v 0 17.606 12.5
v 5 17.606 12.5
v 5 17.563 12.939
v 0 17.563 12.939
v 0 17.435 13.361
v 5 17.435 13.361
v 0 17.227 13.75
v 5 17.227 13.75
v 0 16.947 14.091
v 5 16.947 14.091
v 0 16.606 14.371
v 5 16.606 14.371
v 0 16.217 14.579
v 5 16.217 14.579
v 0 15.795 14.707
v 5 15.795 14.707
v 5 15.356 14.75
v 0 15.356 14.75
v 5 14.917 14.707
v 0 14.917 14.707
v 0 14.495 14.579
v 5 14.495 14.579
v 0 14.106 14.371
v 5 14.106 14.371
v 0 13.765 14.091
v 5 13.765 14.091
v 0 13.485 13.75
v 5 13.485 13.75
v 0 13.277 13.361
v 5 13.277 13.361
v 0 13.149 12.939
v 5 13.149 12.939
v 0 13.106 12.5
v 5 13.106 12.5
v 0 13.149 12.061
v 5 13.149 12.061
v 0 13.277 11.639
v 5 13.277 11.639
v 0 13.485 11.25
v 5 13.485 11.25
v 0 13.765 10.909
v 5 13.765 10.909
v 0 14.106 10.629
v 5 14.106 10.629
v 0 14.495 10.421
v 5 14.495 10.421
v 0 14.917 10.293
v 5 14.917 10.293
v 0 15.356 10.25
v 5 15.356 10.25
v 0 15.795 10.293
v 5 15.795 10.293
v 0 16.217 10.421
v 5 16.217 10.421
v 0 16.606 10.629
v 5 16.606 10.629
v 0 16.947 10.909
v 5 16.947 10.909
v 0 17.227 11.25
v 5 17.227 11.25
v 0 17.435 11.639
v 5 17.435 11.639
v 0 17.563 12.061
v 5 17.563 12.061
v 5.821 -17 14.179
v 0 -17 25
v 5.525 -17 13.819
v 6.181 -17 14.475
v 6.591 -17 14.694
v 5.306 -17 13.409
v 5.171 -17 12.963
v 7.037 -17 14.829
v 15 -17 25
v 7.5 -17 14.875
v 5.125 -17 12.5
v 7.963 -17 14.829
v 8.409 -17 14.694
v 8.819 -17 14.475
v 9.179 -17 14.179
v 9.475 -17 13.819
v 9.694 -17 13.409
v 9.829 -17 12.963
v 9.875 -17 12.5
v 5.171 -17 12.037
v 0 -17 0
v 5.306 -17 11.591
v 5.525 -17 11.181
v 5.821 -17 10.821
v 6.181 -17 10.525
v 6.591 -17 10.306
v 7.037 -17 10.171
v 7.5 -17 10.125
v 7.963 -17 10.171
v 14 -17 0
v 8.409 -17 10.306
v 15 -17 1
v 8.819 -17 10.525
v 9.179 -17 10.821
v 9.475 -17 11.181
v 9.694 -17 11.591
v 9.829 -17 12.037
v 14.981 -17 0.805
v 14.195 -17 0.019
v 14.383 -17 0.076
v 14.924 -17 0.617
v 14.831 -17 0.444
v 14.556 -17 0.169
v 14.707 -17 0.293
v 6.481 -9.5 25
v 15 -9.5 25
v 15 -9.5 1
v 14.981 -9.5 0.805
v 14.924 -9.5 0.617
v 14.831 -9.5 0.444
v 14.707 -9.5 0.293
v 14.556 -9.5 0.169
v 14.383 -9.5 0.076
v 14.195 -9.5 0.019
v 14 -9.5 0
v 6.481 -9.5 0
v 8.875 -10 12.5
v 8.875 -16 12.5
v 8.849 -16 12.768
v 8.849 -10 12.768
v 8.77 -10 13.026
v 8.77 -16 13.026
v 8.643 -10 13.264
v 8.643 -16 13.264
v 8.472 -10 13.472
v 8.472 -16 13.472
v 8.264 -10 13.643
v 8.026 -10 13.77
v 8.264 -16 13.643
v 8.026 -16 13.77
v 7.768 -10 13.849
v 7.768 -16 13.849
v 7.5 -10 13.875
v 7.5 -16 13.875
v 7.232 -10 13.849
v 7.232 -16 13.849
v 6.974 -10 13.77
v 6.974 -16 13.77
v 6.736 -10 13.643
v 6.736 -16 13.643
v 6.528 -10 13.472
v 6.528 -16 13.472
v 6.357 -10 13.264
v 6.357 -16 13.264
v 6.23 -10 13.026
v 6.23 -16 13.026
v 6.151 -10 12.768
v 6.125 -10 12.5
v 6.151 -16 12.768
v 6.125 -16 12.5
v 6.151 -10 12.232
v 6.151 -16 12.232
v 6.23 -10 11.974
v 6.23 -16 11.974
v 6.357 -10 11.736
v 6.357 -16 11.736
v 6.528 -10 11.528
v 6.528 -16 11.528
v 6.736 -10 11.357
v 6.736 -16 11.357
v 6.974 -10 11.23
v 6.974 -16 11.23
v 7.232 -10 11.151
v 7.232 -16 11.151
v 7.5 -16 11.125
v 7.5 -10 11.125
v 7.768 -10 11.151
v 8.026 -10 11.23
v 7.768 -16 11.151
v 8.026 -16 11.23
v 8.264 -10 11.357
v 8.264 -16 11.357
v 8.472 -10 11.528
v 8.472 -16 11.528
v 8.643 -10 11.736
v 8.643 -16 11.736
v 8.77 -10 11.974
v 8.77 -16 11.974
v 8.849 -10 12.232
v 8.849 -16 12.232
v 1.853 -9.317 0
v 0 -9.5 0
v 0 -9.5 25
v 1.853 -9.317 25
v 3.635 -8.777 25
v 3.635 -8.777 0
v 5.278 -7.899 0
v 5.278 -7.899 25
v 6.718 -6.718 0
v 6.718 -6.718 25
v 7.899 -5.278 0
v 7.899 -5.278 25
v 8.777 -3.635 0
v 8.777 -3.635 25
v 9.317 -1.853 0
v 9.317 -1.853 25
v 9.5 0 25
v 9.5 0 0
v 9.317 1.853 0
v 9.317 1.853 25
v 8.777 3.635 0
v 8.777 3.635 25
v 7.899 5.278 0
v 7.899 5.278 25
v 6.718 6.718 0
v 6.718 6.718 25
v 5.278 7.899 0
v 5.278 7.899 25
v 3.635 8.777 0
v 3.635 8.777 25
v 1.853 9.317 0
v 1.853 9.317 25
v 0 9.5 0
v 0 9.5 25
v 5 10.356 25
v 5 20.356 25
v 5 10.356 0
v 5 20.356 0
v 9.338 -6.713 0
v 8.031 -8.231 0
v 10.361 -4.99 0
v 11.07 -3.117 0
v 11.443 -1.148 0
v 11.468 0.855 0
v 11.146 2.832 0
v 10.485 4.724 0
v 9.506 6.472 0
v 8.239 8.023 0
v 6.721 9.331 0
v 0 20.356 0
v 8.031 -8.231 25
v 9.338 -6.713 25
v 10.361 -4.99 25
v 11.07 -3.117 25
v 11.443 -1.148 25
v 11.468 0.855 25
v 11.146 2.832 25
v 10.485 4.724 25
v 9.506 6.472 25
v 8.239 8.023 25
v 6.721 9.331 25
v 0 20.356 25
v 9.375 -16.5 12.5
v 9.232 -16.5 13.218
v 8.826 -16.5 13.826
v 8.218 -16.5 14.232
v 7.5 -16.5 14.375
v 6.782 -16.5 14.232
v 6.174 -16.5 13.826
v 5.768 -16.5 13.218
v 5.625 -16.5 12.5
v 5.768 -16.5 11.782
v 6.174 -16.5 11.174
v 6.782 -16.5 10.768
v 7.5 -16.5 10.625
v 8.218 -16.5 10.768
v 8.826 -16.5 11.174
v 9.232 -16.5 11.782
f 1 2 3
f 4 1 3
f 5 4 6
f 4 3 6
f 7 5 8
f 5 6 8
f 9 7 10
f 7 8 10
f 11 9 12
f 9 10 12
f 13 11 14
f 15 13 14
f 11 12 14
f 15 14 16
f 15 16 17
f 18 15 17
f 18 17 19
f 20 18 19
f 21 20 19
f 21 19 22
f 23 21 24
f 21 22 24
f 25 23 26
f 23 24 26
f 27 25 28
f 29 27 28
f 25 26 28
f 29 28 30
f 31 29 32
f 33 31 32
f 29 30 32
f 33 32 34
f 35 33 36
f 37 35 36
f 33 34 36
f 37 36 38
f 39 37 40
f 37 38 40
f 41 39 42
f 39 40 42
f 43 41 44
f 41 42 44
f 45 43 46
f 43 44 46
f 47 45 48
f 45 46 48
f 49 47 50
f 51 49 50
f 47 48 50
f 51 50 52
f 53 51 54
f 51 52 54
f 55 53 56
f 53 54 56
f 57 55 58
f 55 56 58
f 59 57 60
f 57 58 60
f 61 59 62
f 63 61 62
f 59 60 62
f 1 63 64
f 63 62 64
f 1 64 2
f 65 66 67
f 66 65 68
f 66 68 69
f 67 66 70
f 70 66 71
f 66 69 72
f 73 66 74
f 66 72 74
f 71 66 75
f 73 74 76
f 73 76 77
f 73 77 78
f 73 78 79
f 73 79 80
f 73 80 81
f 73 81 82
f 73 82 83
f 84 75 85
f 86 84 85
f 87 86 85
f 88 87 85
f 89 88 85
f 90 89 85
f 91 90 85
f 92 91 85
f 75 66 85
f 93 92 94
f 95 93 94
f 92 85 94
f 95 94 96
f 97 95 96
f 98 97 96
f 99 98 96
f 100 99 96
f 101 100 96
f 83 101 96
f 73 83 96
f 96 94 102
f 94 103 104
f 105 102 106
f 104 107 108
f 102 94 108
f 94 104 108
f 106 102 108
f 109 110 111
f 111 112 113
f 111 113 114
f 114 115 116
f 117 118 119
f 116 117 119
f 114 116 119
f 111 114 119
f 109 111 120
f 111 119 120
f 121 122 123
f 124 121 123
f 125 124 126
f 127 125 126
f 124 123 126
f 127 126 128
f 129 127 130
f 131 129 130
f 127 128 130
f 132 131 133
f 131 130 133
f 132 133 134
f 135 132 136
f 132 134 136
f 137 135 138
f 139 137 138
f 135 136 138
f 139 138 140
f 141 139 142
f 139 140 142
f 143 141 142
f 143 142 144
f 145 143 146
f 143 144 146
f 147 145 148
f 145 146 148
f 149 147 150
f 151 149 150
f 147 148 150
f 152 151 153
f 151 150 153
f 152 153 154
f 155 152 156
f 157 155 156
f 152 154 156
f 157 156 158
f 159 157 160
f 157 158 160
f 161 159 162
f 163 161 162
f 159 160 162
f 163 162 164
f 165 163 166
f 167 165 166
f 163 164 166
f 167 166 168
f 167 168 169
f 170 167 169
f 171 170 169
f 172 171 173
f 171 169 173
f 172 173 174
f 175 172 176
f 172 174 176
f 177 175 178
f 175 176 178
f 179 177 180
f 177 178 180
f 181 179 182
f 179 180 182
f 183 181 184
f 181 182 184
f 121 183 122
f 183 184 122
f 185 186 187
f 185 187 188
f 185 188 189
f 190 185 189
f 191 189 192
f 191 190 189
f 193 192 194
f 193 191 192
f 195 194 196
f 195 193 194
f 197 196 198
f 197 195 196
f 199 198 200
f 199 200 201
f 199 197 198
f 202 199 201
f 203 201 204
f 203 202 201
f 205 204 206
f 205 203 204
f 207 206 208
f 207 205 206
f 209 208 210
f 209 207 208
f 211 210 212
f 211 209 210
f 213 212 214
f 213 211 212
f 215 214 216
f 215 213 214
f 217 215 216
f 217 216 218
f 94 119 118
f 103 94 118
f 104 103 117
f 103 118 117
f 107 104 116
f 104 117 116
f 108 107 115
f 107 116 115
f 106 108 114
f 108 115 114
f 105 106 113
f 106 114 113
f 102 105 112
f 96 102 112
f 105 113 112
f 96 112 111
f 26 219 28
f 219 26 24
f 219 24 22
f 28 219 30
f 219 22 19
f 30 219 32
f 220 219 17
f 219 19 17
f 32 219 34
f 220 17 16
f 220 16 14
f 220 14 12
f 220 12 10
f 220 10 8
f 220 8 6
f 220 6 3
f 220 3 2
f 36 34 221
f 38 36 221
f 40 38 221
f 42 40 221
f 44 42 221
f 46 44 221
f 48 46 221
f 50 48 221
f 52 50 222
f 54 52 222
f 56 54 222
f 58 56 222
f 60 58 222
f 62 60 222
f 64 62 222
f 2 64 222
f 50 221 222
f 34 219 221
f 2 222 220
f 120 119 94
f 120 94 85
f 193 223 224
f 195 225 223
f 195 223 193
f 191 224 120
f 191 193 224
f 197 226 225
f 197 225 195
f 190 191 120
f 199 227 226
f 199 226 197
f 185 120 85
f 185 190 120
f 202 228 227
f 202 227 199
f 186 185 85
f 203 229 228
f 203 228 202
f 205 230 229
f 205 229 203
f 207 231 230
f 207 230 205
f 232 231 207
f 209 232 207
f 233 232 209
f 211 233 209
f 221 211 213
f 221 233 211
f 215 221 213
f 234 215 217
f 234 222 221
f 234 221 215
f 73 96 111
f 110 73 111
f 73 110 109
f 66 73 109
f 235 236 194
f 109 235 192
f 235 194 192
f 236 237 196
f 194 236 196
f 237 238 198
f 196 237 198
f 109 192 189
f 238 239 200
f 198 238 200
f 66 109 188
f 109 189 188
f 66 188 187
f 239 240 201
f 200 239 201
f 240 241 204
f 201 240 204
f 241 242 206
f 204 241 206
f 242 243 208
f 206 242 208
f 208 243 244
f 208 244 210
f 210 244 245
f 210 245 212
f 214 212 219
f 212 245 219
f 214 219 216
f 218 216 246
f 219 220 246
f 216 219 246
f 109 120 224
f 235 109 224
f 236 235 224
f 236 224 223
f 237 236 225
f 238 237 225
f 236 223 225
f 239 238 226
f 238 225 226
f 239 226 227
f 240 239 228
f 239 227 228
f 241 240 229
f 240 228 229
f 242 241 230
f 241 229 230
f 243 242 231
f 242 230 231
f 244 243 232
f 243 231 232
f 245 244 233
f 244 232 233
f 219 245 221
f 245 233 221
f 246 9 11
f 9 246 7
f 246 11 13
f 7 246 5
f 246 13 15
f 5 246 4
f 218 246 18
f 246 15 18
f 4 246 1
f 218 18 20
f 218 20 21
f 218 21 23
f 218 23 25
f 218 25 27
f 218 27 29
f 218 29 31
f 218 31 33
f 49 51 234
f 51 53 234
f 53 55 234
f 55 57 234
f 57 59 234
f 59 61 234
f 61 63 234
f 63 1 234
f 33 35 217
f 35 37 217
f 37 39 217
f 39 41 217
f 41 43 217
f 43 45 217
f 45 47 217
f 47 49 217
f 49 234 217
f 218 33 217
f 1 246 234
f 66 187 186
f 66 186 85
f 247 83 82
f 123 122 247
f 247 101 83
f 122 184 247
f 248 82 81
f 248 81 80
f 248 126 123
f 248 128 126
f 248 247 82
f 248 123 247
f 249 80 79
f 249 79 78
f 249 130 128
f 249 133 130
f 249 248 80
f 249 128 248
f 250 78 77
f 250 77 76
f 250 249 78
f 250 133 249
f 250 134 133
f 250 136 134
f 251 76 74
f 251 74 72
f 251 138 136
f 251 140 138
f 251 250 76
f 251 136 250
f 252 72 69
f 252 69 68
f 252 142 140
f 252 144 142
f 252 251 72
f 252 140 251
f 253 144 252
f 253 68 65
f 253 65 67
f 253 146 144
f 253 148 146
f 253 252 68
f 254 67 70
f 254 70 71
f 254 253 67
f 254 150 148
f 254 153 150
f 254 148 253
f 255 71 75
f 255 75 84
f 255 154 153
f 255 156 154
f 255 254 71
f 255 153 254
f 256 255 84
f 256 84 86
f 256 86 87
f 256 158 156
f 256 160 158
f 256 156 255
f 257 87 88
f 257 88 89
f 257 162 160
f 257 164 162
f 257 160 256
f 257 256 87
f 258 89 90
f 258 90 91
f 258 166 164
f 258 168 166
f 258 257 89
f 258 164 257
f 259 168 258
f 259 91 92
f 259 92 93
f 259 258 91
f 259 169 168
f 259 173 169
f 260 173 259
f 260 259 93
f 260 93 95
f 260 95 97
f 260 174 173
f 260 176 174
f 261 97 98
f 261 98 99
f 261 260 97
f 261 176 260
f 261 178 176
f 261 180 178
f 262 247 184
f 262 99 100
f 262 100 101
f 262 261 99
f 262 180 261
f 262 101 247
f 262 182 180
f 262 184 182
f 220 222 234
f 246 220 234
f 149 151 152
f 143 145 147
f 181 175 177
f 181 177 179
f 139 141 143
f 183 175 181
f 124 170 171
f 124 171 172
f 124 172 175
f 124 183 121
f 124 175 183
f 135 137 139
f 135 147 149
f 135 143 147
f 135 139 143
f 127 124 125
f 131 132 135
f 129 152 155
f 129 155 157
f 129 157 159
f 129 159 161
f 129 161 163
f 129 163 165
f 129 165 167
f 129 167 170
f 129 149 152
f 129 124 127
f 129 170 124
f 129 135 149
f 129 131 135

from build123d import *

# Parameters (mm, degrees)
PAD003_DEPTH    = 25
SKETCH009_R     = 1.375
POCKET005_DEPTH = 7
SKETCH010_R     = 2.25
POCKET006_DEPTH = 5
FILLET011_R     = 1
CHAMFER_SIZE    = 1


with BuildPart() as part:
    # Sketch007 (on XY_Plane002 of Origin004) → Pad003 (new body)
    with BuildSketch(Plane.XY):
        with BuildLine():
            ThreePointArc((0, -9.5), (9.5, 0), (0, 9.5))
            Line((0, 9.5), (0, 10.356158))
            Line((0, 20.356158), (0, 10.356158))
            Line((5, 20.356158), (0, 20.356158))
            Line((5, 10.356158), (5, 20.356158))
            ThreePointArc((6.480515, -9.500154), (11.468166, 0.855083), (5, 10.356158))
            Line((15, -9.5), (6.480515, -9.500154))
            Line((15, -17), (15, -9.5))
            Line((0, -17), (15, -17))
            Line((0, -9.5), (0, -17))
        make_face()
    extrude(amount=PAD003_DEPTH)

    # Sketch009 (on Face3 of Pad003) → Pocket005 (cut)
    with BuildSketch(Plane.XZ.offset(17)):
        with Locations((7.5, 12.5)):
            Circle(SKETCH009_R)
    extrude(amount=-POCKET005_DEPTH, mode=Mode.SUBTRACT)

    # Sketch010 (on Face10 of Pocket005) → Pocket006 (cut)
    with BuildSketch(Plane.YZ.offset(5)):
        with Locations((15.356158, 12.5)):
            Circle(SKETCH010_R)
    extrude(amount=-POCKET006_DEPTH, mode=Mode.SUBTRACT)

    # Fillet011
    fillet011_edges = [part.edges().sort_by_distance(p)[0] for p in [
        (15, -13.25, 0),
    ]]
    fillet(fillet011_edges, radius=FILLET011_R)

    # Chamfer
    chamfer_edges = [part.edges().sort_by_distance(p)[0] for p in [
        (6.125, -17, 12.5),
    ]]
    chamfer(chamfer_edges, length=CHAMFER_SIZE)


solid = part.part
